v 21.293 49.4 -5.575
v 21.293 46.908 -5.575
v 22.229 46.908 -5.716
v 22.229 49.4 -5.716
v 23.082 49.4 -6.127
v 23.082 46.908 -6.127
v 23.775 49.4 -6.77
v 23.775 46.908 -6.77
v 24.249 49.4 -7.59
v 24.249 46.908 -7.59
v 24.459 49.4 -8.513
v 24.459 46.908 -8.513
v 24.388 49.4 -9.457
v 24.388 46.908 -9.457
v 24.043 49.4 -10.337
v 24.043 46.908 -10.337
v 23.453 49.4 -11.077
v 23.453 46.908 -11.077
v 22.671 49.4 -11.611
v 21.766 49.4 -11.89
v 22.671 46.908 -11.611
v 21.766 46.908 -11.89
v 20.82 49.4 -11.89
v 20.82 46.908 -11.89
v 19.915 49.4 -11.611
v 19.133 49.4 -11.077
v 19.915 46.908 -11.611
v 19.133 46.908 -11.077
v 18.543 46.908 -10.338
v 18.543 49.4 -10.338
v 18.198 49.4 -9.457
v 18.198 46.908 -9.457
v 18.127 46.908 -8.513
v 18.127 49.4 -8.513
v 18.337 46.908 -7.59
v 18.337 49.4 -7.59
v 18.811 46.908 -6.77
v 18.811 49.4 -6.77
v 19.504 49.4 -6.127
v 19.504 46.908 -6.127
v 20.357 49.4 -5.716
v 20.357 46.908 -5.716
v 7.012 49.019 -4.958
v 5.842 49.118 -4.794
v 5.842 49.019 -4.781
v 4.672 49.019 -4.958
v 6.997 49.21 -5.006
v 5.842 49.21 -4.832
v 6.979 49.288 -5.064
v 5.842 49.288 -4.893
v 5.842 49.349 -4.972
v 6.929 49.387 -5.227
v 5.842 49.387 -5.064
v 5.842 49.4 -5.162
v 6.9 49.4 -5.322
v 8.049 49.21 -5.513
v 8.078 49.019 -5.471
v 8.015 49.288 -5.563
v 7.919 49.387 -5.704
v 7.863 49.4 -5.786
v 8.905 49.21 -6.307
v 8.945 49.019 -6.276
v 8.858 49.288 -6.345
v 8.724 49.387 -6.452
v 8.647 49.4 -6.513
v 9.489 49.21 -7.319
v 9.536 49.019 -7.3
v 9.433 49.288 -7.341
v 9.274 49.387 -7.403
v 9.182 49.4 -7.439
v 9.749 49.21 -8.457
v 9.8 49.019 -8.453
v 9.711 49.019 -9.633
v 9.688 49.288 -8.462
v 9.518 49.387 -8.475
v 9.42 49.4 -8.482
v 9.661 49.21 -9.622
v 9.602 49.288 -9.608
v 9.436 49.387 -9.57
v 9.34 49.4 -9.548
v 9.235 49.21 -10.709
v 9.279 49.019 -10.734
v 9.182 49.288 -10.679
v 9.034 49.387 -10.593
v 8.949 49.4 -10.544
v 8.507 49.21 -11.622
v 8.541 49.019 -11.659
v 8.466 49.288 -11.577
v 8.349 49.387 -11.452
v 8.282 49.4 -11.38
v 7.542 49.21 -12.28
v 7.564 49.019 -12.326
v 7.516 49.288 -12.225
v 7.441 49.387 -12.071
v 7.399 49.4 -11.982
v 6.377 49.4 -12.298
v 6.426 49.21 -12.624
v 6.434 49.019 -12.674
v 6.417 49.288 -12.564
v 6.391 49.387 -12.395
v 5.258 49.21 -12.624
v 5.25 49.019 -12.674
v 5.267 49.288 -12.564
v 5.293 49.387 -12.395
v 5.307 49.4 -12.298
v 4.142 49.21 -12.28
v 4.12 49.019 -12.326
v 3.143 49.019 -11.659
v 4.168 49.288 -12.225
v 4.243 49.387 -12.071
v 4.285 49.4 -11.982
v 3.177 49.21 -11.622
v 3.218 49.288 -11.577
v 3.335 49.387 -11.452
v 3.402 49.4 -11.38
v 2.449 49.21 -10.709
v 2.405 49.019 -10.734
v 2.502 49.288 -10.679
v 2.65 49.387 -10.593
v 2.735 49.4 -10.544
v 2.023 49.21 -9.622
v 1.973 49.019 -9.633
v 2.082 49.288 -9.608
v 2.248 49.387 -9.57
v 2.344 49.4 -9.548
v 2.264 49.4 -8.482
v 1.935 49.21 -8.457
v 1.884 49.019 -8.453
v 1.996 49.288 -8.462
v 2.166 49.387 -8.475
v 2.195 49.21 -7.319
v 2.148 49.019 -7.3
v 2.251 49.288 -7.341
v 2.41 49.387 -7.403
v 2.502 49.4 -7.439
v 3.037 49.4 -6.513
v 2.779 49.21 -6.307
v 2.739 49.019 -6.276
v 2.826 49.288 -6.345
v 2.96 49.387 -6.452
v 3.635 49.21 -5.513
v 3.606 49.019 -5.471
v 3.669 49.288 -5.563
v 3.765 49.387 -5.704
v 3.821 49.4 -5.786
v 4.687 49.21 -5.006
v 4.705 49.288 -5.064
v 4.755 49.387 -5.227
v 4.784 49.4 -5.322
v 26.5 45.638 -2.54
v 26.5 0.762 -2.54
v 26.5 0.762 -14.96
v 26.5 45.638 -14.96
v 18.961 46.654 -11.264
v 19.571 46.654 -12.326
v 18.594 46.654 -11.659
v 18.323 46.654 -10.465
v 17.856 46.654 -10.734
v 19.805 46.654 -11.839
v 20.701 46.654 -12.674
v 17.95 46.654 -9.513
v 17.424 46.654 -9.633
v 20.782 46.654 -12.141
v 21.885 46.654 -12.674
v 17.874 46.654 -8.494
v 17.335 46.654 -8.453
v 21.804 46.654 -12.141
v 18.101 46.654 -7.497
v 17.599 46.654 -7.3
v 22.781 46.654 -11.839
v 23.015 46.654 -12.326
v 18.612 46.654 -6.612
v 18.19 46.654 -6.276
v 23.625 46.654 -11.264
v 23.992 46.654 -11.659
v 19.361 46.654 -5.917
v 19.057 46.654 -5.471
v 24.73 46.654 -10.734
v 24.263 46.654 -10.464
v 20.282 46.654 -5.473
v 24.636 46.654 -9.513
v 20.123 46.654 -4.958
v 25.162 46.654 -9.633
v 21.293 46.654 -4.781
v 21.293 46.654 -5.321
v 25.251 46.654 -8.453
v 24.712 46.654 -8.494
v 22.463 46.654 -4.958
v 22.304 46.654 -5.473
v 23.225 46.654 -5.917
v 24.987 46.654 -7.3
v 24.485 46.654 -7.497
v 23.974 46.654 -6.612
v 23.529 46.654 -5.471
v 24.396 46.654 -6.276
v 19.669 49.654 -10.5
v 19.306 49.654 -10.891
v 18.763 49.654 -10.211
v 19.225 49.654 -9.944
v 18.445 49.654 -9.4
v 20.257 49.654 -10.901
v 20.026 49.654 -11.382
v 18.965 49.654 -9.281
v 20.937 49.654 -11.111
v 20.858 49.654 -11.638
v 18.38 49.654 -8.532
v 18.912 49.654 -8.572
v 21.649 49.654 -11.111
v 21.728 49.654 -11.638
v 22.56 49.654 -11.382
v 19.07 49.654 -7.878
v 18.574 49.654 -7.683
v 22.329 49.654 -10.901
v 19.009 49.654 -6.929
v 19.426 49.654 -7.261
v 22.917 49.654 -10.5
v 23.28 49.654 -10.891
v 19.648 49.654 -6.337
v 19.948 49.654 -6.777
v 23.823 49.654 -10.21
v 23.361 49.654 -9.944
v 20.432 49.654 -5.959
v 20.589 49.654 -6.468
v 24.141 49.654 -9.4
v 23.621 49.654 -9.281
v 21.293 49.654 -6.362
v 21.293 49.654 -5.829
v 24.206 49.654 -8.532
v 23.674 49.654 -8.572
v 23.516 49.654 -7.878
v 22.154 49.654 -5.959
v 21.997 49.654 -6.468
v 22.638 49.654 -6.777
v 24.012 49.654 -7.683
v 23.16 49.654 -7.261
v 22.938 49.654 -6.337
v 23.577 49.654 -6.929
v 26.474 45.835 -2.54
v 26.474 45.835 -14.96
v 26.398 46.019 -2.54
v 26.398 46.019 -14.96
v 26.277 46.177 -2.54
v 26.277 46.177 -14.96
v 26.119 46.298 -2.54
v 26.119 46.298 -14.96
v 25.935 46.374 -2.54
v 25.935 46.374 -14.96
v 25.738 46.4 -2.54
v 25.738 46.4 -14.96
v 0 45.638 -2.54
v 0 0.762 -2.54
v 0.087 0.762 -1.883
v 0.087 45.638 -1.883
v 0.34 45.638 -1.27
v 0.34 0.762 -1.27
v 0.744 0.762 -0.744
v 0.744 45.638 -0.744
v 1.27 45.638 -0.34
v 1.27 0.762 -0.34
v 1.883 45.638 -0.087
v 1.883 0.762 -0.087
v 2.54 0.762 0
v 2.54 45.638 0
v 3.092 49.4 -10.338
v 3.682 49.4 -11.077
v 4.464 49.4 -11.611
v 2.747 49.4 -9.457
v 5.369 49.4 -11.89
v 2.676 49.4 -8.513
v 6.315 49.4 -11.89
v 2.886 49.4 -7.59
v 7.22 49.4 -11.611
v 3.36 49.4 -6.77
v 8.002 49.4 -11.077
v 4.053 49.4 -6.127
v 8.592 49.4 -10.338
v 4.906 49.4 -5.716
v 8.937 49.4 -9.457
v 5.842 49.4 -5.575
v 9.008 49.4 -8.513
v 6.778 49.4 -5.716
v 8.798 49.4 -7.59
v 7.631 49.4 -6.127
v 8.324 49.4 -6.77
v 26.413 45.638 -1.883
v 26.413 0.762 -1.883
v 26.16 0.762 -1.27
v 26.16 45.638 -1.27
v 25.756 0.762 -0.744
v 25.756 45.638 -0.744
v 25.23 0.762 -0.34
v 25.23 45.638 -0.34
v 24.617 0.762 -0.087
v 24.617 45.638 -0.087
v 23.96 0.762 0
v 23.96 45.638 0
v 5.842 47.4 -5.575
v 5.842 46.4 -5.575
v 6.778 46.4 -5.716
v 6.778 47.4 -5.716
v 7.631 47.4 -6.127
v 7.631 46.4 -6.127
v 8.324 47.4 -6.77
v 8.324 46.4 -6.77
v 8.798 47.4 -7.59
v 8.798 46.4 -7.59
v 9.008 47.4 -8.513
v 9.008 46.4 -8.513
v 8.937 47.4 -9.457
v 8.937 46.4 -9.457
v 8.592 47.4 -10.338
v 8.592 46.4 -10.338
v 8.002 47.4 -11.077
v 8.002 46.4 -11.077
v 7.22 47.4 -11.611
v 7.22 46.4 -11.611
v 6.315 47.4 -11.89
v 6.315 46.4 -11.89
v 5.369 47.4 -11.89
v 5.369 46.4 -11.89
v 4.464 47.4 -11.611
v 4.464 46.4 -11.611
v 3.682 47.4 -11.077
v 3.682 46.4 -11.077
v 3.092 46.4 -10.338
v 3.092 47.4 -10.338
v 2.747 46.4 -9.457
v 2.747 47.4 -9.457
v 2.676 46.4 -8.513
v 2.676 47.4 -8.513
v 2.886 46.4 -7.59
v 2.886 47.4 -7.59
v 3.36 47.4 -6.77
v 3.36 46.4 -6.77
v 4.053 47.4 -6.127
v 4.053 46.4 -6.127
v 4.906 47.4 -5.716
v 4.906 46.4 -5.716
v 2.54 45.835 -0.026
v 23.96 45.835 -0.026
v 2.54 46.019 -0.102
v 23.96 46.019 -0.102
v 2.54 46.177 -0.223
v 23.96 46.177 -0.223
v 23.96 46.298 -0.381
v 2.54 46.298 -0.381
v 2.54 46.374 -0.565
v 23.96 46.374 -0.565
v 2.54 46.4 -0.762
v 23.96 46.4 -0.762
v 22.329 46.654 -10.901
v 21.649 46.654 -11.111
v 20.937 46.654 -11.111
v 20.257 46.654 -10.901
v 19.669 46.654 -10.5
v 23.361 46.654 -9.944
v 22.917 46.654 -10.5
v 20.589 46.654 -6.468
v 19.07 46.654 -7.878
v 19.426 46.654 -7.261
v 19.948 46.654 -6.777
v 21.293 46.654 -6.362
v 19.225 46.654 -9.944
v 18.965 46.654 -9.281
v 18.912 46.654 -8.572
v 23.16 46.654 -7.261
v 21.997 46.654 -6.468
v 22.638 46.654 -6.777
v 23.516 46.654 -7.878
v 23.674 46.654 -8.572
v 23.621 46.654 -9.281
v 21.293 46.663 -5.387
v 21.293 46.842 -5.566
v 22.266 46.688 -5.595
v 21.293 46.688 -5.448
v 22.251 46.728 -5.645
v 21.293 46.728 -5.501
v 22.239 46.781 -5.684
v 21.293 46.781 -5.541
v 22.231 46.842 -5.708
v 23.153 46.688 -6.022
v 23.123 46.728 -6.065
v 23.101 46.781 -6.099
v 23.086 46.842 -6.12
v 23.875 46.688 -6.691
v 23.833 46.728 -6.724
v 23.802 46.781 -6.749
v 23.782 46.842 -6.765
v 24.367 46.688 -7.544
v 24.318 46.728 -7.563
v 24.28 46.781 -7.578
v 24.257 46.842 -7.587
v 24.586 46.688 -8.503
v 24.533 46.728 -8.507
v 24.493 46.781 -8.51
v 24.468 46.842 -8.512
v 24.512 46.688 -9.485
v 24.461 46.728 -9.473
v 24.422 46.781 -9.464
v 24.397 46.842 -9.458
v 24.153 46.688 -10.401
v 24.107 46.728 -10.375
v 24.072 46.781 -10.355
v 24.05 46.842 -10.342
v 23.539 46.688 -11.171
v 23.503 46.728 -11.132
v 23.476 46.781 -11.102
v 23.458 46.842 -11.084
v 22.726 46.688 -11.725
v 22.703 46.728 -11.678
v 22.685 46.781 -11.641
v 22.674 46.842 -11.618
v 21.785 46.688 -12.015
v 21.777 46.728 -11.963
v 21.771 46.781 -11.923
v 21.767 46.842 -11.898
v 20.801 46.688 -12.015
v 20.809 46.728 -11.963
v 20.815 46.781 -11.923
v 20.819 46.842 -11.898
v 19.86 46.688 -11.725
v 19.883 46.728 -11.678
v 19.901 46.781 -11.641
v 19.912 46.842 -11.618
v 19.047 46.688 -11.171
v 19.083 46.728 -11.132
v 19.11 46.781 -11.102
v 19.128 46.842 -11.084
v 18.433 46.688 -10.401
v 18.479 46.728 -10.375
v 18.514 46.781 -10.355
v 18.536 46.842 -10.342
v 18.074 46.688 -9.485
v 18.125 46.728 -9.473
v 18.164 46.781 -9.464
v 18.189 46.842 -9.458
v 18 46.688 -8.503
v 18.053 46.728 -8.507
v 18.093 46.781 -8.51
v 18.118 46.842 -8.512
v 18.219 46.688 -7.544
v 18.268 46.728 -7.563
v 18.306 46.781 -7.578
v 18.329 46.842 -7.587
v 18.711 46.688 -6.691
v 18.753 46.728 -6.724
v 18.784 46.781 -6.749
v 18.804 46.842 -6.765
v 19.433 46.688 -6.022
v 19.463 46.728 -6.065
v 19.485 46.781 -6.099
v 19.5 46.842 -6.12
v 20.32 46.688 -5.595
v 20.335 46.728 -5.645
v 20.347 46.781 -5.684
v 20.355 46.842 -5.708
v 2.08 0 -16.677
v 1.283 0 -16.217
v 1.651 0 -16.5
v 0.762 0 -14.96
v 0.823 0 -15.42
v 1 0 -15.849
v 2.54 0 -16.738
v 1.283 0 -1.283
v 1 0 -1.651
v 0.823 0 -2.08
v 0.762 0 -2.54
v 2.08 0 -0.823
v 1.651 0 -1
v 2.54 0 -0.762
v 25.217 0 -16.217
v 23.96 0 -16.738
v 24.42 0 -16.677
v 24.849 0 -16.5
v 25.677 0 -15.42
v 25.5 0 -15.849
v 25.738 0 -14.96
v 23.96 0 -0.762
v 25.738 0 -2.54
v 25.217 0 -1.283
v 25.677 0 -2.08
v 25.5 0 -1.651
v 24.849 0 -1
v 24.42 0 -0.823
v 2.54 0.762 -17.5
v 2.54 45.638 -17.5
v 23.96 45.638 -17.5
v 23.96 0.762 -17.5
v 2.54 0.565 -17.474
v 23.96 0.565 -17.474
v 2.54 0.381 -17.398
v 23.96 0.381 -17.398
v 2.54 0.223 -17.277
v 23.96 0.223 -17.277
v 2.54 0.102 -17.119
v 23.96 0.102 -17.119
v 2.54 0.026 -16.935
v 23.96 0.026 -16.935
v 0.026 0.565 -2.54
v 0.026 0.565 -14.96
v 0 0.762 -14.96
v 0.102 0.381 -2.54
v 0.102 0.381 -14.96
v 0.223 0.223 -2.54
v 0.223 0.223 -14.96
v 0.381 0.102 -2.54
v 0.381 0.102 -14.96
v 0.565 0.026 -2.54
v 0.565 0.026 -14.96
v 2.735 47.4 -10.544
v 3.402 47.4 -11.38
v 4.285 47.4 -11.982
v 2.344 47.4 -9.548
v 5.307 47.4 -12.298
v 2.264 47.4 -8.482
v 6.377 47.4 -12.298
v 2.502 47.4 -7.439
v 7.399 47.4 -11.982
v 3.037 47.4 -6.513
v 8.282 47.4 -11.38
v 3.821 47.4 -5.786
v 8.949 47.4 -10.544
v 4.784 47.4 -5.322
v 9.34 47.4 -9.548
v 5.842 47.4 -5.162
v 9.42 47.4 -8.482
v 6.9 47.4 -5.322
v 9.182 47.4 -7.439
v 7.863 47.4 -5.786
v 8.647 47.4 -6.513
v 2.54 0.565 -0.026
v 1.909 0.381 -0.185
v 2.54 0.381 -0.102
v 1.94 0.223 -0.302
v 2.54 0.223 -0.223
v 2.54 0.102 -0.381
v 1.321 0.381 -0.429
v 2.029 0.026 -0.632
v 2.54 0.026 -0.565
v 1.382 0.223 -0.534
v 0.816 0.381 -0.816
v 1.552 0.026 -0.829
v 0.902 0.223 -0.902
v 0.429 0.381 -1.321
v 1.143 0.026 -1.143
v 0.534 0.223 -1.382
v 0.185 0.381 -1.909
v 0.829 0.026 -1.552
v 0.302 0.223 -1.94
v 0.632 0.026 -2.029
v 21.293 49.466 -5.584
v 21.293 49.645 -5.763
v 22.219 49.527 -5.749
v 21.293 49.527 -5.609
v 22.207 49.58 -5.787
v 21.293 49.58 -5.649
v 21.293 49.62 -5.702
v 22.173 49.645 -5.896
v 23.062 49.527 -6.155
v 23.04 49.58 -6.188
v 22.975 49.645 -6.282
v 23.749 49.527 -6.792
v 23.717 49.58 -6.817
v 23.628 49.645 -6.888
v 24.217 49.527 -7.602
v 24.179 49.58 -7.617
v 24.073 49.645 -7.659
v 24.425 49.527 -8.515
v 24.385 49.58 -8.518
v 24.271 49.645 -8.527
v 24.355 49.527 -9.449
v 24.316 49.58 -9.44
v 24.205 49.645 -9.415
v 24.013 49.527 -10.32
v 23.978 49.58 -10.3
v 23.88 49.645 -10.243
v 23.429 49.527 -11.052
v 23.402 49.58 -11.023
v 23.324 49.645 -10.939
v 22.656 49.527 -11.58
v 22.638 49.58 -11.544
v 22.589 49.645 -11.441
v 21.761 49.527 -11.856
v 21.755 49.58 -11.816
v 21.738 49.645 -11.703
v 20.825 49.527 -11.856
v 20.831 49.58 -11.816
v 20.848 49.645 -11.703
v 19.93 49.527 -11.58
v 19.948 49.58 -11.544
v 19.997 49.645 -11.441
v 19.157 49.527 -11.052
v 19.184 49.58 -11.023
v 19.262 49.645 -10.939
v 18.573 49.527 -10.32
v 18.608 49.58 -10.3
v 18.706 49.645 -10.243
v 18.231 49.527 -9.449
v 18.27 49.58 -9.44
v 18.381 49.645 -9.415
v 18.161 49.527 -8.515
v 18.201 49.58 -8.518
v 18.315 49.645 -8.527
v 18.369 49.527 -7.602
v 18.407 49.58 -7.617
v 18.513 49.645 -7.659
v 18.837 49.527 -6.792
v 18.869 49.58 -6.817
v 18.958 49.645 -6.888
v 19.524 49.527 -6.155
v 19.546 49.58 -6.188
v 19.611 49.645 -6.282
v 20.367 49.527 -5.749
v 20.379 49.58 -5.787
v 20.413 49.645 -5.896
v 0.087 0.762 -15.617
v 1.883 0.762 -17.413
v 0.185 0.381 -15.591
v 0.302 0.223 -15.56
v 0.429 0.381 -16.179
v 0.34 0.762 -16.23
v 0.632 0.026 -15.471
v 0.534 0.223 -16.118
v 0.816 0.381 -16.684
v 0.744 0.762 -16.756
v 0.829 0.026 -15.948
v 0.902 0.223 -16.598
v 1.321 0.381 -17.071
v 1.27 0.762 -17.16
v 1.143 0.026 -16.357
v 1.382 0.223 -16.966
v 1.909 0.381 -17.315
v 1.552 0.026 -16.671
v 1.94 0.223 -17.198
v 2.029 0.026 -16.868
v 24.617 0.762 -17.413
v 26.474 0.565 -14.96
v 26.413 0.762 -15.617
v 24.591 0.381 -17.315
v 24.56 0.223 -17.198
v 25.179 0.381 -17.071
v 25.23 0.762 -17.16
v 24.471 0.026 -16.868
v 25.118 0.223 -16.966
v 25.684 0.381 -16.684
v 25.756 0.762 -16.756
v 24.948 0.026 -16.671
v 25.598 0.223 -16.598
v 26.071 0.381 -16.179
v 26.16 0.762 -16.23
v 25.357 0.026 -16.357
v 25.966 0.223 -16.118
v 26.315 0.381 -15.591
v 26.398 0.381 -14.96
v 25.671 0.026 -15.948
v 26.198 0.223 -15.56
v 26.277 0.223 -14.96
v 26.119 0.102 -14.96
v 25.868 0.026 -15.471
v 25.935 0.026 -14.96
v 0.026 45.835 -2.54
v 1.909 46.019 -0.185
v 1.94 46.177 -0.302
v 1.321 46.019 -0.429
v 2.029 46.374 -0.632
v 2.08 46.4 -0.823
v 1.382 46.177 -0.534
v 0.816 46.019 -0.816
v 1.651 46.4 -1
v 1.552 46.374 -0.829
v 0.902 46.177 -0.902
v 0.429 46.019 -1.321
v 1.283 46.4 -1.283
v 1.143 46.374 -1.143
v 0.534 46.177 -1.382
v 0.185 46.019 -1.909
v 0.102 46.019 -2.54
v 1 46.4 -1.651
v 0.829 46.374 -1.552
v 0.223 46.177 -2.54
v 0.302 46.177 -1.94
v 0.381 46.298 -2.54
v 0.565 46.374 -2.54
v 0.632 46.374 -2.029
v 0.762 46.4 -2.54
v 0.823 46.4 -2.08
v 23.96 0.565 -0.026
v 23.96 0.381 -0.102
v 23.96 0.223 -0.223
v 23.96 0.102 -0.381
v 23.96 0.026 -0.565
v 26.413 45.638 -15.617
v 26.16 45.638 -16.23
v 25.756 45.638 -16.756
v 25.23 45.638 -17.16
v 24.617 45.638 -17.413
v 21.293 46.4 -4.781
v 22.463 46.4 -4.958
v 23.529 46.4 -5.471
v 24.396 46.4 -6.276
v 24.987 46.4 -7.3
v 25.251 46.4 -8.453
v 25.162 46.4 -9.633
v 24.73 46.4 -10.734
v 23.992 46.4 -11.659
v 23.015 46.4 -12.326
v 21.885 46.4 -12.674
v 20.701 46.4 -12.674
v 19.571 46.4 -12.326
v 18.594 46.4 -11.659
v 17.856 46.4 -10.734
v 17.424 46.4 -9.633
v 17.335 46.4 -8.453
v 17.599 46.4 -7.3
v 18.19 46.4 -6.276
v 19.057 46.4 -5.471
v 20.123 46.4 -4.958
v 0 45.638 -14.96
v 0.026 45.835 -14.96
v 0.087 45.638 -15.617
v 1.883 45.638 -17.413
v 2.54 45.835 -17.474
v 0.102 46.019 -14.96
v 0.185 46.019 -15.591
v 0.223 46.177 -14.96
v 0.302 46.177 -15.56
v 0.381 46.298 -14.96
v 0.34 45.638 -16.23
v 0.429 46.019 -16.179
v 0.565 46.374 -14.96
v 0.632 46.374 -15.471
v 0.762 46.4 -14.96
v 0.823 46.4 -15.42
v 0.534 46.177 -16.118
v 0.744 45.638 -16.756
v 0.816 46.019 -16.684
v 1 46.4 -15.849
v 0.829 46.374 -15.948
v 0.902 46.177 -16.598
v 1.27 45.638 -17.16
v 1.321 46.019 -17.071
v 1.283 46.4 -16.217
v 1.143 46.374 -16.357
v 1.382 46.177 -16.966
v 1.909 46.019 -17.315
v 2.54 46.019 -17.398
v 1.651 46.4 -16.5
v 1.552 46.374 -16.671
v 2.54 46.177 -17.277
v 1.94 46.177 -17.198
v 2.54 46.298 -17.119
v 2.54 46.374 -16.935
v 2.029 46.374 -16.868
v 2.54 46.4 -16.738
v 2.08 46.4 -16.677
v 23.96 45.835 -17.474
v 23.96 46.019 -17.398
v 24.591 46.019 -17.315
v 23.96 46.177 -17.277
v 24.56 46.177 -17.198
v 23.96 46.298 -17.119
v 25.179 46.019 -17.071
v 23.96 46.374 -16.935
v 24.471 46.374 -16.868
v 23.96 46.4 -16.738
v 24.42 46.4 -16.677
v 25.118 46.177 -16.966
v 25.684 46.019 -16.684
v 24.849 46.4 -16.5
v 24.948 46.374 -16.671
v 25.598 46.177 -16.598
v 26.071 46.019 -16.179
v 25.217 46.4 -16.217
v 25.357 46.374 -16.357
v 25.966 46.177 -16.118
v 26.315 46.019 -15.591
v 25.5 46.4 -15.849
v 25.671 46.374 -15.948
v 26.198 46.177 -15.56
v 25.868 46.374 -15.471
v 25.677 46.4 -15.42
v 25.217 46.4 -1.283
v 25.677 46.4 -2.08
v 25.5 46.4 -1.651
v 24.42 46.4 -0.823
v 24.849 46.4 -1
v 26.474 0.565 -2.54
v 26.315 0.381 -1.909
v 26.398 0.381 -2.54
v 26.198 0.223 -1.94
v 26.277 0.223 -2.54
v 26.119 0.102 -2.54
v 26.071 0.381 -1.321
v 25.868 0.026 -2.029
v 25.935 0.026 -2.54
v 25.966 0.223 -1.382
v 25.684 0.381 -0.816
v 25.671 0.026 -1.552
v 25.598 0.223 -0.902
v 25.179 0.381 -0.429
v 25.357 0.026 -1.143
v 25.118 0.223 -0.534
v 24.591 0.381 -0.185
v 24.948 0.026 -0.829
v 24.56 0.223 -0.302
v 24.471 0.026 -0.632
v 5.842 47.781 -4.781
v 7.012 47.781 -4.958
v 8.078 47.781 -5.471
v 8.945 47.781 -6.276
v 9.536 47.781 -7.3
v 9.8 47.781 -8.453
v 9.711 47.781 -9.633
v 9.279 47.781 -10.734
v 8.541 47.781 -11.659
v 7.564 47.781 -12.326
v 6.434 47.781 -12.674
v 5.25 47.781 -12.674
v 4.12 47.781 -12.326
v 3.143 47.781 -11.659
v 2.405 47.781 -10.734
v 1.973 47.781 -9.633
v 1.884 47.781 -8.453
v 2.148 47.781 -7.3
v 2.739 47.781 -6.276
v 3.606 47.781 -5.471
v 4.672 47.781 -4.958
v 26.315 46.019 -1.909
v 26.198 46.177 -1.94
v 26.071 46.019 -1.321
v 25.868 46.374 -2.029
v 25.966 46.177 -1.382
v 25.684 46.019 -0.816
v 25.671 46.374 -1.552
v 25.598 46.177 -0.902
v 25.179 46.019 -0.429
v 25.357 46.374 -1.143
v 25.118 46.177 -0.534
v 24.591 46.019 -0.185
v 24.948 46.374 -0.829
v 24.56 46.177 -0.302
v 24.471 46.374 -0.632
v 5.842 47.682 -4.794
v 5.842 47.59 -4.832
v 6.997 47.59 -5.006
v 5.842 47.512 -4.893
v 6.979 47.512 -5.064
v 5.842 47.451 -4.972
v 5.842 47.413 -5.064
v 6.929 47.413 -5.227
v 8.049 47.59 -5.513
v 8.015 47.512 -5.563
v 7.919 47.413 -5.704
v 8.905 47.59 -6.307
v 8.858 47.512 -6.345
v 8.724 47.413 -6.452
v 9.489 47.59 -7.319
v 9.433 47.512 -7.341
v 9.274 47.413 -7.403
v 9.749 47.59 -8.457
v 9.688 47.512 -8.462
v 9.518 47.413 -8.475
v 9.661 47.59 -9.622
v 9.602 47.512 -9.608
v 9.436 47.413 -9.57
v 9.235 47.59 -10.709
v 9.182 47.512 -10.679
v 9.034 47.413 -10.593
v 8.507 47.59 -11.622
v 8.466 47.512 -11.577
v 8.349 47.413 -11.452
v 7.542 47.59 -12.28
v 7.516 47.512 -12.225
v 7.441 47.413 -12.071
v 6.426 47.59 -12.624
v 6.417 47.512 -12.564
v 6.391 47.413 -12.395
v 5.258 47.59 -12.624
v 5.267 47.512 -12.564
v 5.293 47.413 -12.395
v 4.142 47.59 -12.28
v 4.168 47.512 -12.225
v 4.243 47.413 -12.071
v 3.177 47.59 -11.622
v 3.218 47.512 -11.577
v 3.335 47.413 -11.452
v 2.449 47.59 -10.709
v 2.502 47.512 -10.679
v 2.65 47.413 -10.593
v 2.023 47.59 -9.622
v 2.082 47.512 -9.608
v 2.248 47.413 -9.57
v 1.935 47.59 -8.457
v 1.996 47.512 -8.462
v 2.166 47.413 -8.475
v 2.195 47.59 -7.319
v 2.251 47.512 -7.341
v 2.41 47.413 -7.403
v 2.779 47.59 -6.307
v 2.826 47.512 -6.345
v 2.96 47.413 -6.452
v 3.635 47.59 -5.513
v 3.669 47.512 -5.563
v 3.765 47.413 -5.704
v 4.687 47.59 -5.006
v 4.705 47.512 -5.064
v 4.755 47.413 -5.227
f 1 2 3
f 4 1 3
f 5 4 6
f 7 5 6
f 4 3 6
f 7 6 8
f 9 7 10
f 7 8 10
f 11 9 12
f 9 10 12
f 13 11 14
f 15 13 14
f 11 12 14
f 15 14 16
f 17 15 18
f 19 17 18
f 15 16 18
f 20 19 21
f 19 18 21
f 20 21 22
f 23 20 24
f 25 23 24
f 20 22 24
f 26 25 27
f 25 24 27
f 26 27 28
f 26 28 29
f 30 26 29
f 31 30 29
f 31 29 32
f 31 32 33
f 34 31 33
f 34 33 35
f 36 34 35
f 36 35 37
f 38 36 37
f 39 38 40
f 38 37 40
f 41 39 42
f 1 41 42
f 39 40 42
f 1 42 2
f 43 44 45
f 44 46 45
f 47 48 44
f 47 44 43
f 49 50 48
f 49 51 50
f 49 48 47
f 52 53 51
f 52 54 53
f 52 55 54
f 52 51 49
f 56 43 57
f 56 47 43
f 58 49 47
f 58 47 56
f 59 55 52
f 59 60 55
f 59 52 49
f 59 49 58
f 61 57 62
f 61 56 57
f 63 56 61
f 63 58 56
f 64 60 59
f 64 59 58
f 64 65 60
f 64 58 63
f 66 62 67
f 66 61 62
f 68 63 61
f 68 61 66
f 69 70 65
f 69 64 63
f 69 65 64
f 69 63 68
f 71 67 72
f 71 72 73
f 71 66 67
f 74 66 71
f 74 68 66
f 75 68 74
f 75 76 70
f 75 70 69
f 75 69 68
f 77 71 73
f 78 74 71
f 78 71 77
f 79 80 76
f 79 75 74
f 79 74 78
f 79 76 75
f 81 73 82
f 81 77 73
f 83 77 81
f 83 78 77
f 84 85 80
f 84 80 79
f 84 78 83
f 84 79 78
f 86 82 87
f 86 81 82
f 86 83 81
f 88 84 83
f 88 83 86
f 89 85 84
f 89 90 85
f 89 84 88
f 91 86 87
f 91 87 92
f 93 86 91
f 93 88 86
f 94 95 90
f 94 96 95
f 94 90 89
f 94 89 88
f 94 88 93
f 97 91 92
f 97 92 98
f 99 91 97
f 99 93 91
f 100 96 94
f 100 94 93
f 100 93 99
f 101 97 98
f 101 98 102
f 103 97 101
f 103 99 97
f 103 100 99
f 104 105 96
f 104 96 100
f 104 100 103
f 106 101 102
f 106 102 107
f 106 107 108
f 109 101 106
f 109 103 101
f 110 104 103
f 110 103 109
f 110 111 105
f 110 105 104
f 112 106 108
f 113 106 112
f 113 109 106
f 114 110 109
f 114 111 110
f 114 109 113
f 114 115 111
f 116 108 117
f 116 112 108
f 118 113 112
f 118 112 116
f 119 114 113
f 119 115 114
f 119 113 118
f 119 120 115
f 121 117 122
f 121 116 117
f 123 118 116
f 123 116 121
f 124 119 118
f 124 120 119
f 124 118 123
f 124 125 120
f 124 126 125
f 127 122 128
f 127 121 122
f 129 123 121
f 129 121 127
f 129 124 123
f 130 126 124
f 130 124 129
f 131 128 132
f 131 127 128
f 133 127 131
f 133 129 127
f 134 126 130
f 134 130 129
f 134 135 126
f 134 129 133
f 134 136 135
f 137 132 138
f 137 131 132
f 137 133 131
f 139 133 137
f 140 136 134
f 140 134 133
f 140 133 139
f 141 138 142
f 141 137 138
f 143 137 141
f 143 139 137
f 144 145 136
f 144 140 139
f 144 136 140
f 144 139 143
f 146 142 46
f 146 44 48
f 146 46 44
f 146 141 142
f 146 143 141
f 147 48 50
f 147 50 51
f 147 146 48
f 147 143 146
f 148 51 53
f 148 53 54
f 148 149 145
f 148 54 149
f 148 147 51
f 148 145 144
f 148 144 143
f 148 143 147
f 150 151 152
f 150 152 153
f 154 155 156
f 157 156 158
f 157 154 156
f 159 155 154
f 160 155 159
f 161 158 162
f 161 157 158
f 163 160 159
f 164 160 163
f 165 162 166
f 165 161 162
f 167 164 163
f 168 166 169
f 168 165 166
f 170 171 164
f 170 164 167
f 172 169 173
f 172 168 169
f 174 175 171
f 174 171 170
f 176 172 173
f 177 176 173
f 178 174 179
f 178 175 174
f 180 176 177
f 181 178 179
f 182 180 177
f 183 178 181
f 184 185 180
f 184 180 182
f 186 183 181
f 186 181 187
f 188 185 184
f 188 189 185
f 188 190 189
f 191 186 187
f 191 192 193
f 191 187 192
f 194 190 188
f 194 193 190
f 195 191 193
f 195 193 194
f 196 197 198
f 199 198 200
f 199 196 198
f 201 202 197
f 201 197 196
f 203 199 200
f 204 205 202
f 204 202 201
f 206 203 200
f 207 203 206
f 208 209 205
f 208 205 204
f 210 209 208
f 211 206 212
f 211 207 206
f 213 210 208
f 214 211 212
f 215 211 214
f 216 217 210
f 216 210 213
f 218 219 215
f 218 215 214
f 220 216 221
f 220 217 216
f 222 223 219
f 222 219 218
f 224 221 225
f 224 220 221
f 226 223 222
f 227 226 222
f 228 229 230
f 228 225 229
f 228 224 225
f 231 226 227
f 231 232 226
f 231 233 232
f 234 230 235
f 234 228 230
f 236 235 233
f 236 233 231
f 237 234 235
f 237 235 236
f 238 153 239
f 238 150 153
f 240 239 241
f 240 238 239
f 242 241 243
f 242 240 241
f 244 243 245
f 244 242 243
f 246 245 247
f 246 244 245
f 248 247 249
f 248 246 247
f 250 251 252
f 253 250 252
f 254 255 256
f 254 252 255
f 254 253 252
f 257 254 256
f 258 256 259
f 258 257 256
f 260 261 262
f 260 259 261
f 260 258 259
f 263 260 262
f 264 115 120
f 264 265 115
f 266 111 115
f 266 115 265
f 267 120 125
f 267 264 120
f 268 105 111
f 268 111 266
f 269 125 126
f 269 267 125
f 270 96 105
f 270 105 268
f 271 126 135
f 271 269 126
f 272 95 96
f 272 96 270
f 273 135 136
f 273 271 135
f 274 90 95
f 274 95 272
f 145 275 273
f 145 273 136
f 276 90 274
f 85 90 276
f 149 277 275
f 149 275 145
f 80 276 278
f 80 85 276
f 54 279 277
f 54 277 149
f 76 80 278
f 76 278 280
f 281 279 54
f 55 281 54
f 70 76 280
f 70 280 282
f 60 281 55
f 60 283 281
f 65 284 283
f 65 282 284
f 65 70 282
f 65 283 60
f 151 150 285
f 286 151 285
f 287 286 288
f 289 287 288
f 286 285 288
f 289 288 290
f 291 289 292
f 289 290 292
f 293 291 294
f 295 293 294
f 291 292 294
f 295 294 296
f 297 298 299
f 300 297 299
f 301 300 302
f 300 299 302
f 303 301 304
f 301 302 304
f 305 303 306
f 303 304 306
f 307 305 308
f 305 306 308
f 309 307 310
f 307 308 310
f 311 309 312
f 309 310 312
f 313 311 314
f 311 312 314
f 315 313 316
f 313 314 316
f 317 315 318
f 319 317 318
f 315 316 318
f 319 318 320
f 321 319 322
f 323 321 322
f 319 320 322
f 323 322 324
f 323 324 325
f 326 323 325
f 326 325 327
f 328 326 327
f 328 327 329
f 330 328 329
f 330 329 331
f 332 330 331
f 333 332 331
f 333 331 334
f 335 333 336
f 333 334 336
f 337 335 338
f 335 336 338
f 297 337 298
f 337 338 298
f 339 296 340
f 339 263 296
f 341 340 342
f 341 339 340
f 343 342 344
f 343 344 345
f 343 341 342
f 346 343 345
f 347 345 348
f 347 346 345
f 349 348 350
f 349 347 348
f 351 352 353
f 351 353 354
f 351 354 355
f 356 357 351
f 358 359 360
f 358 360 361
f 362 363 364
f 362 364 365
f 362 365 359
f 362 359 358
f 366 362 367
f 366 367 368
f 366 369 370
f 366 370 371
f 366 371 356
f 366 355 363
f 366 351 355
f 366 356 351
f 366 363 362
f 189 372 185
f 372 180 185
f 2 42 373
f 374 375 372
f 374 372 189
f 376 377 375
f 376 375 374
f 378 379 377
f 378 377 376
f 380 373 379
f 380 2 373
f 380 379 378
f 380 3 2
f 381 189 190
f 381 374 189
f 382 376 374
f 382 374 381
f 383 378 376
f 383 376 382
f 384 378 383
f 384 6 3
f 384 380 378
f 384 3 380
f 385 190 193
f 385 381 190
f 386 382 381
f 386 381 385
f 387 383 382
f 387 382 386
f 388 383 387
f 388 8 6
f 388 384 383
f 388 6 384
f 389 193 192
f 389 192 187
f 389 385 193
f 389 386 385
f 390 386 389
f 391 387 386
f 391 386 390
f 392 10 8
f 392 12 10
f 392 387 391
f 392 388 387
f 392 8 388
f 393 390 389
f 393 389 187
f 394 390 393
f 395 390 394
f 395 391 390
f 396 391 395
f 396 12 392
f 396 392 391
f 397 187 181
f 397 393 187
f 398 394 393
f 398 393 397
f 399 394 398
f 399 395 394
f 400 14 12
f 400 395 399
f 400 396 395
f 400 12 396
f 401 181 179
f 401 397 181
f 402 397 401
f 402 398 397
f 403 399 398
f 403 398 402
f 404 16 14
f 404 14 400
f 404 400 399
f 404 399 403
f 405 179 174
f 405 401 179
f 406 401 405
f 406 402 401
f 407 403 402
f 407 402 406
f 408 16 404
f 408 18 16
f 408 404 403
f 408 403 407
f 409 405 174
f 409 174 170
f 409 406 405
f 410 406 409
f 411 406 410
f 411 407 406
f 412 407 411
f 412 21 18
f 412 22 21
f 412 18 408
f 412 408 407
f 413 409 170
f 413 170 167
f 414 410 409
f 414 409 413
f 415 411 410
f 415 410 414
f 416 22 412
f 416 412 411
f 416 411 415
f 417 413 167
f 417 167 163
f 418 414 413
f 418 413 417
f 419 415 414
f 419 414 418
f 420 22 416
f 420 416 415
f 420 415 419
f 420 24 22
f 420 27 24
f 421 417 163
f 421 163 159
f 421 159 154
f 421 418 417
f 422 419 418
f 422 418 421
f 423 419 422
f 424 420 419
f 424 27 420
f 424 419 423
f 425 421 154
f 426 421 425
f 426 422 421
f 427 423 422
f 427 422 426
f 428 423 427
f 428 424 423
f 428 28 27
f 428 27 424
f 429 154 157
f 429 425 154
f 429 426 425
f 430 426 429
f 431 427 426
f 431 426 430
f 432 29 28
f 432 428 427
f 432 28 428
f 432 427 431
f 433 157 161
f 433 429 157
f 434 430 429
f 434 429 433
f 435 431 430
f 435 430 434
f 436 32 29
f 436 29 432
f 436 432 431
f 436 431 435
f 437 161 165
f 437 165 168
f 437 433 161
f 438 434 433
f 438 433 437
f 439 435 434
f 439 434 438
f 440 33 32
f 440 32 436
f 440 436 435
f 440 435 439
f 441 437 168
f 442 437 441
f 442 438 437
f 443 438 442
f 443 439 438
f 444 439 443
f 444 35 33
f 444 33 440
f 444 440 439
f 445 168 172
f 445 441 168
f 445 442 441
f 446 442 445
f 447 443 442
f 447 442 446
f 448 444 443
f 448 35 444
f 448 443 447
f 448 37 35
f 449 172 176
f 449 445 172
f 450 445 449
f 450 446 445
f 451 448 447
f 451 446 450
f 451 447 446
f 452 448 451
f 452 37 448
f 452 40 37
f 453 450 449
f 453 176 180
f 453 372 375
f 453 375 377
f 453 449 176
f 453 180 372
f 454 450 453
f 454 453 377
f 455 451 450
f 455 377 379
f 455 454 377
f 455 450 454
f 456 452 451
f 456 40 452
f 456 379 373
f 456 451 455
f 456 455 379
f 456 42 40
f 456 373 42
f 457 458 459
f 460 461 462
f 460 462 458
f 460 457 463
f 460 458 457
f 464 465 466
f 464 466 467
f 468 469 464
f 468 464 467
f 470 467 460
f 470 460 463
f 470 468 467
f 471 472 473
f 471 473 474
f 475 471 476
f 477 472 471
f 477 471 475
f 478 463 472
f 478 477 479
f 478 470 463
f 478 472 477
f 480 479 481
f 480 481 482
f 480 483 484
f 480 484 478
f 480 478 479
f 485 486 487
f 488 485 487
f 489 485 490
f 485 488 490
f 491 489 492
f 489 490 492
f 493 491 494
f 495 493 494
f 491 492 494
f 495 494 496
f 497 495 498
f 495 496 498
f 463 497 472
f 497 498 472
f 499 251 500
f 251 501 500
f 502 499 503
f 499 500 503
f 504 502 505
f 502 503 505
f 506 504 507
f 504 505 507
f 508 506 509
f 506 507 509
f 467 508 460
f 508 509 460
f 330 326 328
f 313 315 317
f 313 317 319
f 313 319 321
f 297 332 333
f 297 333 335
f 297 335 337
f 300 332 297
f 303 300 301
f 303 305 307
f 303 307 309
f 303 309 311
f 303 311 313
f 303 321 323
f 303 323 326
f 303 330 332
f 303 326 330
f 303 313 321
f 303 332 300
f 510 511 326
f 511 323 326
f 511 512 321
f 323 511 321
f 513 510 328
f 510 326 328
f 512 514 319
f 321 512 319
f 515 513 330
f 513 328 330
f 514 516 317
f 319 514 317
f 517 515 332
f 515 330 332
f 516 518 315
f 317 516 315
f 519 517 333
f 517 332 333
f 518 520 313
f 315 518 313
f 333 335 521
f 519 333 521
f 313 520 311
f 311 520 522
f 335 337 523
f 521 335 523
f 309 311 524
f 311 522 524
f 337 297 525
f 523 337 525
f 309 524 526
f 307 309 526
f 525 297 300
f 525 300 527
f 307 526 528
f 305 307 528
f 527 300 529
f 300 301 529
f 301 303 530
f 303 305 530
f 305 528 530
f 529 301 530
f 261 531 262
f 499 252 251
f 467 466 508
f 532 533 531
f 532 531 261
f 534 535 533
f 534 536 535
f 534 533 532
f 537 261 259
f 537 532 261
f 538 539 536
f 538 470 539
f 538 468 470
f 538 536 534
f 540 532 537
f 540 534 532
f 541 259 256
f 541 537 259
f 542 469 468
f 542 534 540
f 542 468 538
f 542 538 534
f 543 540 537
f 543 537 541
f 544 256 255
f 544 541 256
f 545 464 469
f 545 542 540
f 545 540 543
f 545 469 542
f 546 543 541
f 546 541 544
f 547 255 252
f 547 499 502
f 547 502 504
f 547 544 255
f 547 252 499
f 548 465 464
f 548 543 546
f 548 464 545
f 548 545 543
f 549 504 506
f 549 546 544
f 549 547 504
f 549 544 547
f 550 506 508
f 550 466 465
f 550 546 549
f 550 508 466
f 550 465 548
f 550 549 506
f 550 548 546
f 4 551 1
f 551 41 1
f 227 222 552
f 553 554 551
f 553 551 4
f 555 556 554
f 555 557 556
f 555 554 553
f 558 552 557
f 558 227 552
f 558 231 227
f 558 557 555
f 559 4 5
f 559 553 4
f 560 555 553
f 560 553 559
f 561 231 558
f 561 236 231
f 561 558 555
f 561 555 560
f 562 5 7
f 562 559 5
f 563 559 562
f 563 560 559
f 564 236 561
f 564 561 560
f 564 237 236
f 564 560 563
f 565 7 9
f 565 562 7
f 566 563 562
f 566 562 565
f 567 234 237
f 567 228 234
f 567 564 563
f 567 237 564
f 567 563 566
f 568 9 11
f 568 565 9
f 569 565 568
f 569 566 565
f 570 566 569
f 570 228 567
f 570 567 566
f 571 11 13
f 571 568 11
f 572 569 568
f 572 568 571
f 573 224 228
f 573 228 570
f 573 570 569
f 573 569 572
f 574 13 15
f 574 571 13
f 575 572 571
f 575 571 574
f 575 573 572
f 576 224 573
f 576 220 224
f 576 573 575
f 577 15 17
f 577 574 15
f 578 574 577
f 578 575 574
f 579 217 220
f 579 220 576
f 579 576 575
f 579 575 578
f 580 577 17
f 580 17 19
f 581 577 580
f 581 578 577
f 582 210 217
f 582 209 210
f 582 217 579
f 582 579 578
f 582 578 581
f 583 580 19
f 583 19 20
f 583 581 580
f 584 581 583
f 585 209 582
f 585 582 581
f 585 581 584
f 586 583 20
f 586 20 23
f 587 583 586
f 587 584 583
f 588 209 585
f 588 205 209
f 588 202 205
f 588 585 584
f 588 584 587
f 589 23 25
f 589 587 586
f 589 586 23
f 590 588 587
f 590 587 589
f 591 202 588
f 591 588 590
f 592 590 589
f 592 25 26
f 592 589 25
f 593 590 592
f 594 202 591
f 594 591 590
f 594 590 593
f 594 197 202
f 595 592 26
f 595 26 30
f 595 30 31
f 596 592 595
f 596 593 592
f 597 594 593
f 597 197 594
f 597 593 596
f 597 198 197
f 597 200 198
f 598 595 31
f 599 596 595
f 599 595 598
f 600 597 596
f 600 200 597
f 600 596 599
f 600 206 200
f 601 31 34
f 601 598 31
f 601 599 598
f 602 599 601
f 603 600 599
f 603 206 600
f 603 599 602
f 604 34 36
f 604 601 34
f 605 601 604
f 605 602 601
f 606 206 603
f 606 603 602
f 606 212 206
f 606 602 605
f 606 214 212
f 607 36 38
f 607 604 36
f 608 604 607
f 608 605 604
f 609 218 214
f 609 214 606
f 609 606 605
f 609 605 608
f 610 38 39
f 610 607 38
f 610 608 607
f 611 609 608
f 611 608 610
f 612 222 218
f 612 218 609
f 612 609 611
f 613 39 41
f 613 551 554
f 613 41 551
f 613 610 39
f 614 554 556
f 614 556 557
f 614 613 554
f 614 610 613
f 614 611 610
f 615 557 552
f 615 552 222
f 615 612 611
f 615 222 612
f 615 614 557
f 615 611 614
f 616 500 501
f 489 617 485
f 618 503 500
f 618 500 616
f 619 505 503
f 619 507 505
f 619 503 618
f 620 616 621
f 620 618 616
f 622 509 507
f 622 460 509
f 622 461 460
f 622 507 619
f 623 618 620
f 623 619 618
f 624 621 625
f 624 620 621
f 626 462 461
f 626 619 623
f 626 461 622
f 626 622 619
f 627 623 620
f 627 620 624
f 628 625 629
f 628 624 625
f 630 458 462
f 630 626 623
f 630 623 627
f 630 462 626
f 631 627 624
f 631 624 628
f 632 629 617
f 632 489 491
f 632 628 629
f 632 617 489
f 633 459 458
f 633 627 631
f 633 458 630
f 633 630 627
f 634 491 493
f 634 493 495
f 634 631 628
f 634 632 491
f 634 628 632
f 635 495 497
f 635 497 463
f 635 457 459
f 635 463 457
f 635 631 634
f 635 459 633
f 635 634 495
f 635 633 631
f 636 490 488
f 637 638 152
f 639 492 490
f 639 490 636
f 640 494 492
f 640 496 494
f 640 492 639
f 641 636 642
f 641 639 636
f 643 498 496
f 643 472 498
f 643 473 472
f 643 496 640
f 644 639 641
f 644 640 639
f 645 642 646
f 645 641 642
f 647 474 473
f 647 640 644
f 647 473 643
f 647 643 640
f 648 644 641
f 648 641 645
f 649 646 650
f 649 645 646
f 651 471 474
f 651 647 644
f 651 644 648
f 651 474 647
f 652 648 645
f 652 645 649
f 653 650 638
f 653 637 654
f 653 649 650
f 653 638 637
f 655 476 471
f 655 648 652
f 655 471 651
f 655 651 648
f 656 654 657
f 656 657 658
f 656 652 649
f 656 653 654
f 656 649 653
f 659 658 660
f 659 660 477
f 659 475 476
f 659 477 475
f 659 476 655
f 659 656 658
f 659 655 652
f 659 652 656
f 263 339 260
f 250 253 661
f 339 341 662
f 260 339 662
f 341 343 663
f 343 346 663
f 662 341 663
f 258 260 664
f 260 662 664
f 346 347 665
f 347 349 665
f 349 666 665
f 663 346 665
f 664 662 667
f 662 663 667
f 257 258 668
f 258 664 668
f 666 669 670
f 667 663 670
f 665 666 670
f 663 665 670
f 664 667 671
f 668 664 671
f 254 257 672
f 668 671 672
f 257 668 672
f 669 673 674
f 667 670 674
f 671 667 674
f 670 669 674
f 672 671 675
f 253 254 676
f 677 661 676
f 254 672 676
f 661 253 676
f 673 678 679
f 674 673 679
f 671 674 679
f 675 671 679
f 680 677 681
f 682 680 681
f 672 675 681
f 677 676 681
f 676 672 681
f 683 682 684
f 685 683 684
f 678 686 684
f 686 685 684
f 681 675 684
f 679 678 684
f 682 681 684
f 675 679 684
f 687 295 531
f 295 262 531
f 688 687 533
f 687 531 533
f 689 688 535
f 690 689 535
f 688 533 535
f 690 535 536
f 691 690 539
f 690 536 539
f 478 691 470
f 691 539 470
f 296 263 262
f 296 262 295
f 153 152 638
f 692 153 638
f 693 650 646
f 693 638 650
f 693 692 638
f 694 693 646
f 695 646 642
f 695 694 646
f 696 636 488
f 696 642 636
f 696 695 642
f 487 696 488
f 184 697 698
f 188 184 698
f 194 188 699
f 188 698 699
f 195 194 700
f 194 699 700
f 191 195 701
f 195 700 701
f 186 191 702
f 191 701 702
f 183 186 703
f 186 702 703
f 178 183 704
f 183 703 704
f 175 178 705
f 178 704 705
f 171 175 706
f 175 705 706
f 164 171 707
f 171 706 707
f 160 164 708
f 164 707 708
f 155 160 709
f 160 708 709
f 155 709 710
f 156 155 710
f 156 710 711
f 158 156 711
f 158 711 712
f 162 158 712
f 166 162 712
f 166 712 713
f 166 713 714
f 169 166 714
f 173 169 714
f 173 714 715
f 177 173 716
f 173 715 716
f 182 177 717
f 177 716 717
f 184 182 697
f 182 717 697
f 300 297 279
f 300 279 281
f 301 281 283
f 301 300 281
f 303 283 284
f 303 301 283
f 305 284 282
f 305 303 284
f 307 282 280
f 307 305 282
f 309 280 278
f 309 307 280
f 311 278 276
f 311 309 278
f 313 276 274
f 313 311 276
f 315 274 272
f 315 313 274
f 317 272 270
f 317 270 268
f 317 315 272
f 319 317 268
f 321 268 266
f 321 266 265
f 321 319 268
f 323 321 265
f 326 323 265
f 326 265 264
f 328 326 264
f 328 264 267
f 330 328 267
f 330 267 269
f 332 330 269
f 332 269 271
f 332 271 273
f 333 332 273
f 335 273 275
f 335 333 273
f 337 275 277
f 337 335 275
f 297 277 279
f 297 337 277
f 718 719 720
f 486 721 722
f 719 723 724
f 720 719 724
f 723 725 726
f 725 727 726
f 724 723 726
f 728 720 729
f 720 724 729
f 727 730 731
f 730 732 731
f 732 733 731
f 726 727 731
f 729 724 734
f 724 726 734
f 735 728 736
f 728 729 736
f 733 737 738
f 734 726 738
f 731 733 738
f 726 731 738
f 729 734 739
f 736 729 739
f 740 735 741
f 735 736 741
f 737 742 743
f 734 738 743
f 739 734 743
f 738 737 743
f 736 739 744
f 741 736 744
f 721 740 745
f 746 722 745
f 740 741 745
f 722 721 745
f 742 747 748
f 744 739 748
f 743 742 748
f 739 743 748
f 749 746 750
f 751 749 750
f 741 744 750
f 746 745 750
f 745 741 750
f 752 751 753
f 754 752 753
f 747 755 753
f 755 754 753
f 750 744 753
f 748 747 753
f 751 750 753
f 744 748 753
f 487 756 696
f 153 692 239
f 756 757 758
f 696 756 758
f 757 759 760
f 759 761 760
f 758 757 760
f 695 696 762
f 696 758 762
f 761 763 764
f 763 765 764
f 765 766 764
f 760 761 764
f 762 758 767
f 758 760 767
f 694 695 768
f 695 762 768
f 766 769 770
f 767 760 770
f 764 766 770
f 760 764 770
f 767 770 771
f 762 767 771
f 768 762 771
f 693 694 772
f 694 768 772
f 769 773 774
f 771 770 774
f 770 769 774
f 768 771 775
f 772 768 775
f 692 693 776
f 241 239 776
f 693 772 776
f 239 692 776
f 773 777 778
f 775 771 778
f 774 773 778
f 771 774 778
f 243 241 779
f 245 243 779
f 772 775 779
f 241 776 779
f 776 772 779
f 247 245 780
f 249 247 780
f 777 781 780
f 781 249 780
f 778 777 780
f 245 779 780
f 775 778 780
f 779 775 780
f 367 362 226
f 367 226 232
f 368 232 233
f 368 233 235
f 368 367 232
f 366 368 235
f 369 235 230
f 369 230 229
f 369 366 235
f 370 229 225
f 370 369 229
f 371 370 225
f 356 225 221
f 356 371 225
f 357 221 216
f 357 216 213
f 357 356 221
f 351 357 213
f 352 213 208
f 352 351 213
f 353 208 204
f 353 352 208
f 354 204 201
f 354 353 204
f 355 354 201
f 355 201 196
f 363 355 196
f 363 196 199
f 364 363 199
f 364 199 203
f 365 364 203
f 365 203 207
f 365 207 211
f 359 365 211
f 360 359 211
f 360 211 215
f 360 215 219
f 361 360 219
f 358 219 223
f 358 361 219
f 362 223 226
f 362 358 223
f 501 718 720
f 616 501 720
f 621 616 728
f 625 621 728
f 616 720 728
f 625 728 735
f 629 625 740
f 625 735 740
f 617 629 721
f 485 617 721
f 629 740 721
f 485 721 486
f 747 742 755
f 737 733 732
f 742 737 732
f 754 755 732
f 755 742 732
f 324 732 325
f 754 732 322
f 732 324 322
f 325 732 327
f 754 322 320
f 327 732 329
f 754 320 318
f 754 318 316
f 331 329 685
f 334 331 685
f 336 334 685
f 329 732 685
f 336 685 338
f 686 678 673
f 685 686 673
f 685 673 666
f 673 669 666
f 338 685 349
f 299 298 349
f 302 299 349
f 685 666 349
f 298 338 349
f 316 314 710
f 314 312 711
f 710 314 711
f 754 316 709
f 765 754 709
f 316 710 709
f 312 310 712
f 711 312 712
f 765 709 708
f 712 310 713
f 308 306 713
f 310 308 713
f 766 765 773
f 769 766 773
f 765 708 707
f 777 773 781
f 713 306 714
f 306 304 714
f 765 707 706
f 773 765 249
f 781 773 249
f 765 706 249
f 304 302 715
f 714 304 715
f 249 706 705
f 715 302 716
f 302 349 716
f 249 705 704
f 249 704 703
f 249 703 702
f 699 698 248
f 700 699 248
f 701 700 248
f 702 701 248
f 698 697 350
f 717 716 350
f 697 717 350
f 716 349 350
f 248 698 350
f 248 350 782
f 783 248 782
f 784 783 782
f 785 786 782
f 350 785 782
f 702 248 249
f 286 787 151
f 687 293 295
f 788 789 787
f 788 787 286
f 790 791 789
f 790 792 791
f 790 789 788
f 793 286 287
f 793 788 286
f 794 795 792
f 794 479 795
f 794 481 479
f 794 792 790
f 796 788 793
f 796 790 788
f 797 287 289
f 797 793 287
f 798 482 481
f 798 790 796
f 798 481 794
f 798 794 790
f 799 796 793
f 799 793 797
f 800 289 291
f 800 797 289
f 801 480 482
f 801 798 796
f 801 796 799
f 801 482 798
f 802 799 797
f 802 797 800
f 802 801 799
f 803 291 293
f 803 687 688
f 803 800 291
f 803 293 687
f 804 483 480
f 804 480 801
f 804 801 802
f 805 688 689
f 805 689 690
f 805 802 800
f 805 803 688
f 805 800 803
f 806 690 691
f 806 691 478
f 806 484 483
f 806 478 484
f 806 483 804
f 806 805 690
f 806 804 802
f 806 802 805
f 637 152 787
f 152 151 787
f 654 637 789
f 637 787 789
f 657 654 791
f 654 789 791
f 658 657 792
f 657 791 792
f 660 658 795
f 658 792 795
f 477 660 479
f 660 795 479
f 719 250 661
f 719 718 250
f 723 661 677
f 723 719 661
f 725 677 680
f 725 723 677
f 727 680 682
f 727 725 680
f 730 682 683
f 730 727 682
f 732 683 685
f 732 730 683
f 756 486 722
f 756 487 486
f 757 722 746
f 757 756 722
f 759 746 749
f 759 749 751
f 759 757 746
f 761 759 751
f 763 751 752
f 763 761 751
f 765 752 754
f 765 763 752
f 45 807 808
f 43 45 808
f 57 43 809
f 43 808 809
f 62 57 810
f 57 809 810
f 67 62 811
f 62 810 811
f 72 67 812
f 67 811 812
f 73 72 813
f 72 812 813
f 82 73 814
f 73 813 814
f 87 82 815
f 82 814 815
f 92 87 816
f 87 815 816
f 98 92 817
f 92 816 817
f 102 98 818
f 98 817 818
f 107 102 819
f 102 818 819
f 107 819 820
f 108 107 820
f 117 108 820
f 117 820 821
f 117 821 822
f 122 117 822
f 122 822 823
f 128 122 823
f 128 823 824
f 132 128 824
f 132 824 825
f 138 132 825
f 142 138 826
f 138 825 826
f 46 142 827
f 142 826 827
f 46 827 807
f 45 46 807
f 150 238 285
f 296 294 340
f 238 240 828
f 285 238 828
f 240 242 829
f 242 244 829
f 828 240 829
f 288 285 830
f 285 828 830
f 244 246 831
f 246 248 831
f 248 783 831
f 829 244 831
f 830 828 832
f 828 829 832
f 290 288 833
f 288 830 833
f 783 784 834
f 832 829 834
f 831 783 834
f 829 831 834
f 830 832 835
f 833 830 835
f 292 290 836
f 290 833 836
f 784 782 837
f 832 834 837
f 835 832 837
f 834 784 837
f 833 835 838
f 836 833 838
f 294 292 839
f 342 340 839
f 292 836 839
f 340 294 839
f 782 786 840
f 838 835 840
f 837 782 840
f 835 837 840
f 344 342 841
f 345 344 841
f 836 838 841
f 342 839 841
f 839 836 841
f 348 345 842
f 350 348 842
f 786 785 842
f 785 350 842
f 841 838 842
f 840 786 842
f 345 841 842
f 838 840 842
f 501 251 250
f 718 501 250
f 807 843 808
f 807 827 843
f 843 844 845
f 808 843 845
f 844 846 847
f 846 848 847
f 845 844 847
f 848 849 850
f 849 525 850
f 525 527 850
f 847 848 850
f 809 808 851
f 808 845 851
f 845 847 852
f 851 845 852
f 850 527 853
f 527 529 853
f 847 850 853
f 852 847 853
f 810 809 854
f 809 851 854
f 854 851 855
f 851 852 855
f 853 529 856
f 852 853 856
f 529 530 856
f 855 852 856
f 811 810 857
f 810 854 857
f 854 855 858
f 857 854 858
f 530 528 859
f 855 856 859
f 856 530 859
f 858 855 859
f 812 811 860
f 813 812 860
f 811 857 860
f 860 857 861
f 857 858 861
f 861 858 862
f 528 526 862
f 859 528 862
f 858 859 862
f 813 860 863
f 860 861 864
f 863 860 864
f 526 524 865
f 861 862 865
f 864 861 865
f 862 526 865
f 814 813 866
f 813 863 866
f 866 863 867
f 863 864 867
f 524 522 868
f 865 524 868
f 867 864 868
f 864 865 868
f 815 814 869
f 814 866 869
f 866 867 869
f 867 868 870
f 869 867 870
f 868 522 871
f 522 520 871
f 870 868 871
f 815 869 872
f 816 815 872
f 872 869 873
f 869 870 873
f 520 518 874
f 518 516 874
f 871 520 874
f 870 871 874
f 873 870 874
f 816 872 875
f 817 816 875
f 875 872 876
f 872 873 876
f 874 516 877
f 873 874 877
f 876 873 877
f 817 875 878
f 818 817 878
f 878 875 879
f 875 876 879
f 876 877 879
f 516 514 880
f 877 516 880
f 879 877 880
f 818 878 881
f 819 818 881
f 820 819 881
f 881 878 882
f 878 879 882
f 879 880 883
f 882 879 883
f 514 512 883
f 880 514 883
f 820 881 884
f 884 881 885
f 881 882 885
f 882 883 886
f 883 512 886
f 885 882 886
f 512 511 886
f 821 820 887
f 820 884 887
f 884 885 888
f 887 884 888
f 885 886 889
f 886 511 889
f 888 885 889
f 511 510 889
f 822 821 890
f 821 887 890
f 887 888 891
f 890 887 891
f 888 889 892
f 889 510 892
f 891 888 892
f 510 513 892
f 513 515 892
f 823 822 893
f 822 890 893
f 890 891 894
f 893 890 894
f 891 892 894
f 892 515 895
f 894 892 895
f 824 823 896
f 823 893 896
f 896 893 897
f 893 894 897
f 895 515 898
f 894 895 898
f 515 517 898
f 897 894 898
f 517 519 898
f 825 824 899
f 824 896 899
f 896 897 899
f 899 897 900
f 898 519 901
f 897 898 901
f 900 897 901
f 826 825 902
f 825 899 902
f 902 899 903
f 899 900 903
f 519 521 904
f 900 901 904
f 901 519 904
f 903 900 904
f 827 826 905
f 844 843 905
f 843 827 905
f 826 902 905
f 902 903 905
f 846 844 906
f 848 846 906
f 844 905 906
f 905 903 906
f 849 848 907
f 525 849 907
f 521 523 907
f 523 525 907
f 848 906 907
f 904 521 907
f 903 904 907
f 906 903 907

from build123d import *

# Parameters (mm, degrees)
SKETCH2_W           = 26.5
SKETCH2_H           = 46.4
BOSS_EXTRUDE1_DEPTH = 17.5
FILLET1_R           = 2.54
FILLET2_R           = 0.762
SKETCH3_R           = 3.96875
BOSS_EXTRUDE2_DEPTH = 0.254
SKETCH4_R           = 3.175
SKETCH4_R_2         = 2.3876
BOSS_EXTRUDE3_DEPTH = 3
FILLET3_R           = 0.254
SKETCH5_R           = 3.175
BOSS_EXTRUDE4_DEPTH = 1
SKETCH6_R           = 3.96875
SKETCH6_R_2         = 3.175
BOSS_EXTRUDE5_DEPTH = 2
FILLET4_R           = 0.381


with BuildPart() as part:
    # Sketch2 → Boss-Extrude1 (new body)
    with BuildSketch(Plane.XY):
        with Locations((13.25, 23.2)):
            Rectangle(SKETCH2_W, SKETCH2_H)
    extrude(amount=-BOSS_EXTRUDE1_DEPTH)

    # Fillet1
    fillet1_edges = [part.edges().sort_by_distance(p)[0] for p in [
        (26.5, 23.2, -17.5),
        (0, 23.2, -17.5),
        (26.5, 23.2, 0),
        (0, 23.2, 0),
    ]]
    fillet(fillet1_edges, radius=FILLET1_R)

    # Fillet2
    fillet2_edges = [part.edges().sort_by_distance(p)[0] for p in [
        (0, 46.4, -8.75),
        (0, 0, -8.75),
        (13.25, 0, 0),
        (13.25, 0, -17.5),
        (26.5, 0, -8.75),
        (25.756051224, 0, -0.743948776),
        (25.756051224, 0, -16.756051224),
        (0.743948776, 0, -0.743948776),
        (0.743948776, 0, -16.756051224),
        (13.25, 46.4, -17.5),
        (13.25, 46.4, 0),
        (26.5, 46.4, -8.75),
        (25.756051224, 46.4, -0.743948776),
        (25.756051224, 46.4, -16.756051224),
        (0.743948776, 46.4, -0.743948776),
        (0.743948776, 46.4, -16.756051224),
    ]]
    fillet(fillet2_edges, radius=FILLET2_R)

    # Sketch3 → Boss-Extrude2 (add)
    with BuildSketch(Plane(origin=(0, 46.4, 0), x_dir=(1, 0, 0), z_dir=(0, 1, 0))):
        with Locations(Location((21.293, 8.75, 0), (0, 0, 270))):
            Circle(SKETCH3_R)
    extrude(amount=BOSS_EXTRUDE2_DEPTH)

    # Sketch4 → Boss-Extrude3 (add)
    with BuildSketch(Plane(origin=(0, 46.654, 0), x_dir=(1, 0, 0), z_dir=(0, 1, 0))):
        with Locations(Location((21.293, 8.75, 0), (0, 0, 270))):
            Circle(SKETCH4_R)
        with Locations(Location((21.293, 8.75, 0), (0, 0, 270))):
            Circle(SKETCH4_R_2, mode=Mode.SUBTRACT)
    extrude(amount=BOSS_EXTRUDE3_DEPTH)

    # Fillet3
    fillet3_edges = [part.edges().sort_by_distance(p)[0] for p in [
        (21.293, 49.654, -11.925),
        (21.293, 46.654, -11.925),
    ]]
    fillet(fillet3_edges, radius=FILLET3_R)

    # Sketch5 → Boss-Extrude4 (add)
    with BuildSketch(Plane(origin=(0, 46.4, 0), x_dir=(1, 0, 0), z_dir=(0, 1, 0))):
        with Locations(Location((5.842, 8.75, 0), (0, 0, 270))):
            Circle(SKETCH5_R)
    extrude(amount=BOSS_EXTRUDE4_DEPTH)


with BuildPart() as body_2:
    # Sketch6 → Boss-Extrude5 (new body)
    with BuildSketch(Plane(origin=(0, 47.4, 0), x_dir=(1, 0, 0), z_dir=(0, 1, 0))):
        with Locations(Location((5.842, 8.75, 0), (0, 0, 270))):
            Circle(SKETCH6_R)
        with Locations(Location((5.842, 8.75, 0), (0, 0, 270))):
            Circle(SKETCH6_R_2, mode=Mode.SUBTRACT)
    extrude(amount=BOSS_EXTRUDE5_DEPTH)

    # Fillet4
    fillet4_edges = [body_2.edges().sort_by_distance(p)[0] for p in [
        (5.842, 47.4, -12.71875),
        (5.842, 49.4, -12.71875),
    ]]
    fillet(fillet4_edges, radius=FILLET4_R)


solid = Compound([part.part, body_2.part])
